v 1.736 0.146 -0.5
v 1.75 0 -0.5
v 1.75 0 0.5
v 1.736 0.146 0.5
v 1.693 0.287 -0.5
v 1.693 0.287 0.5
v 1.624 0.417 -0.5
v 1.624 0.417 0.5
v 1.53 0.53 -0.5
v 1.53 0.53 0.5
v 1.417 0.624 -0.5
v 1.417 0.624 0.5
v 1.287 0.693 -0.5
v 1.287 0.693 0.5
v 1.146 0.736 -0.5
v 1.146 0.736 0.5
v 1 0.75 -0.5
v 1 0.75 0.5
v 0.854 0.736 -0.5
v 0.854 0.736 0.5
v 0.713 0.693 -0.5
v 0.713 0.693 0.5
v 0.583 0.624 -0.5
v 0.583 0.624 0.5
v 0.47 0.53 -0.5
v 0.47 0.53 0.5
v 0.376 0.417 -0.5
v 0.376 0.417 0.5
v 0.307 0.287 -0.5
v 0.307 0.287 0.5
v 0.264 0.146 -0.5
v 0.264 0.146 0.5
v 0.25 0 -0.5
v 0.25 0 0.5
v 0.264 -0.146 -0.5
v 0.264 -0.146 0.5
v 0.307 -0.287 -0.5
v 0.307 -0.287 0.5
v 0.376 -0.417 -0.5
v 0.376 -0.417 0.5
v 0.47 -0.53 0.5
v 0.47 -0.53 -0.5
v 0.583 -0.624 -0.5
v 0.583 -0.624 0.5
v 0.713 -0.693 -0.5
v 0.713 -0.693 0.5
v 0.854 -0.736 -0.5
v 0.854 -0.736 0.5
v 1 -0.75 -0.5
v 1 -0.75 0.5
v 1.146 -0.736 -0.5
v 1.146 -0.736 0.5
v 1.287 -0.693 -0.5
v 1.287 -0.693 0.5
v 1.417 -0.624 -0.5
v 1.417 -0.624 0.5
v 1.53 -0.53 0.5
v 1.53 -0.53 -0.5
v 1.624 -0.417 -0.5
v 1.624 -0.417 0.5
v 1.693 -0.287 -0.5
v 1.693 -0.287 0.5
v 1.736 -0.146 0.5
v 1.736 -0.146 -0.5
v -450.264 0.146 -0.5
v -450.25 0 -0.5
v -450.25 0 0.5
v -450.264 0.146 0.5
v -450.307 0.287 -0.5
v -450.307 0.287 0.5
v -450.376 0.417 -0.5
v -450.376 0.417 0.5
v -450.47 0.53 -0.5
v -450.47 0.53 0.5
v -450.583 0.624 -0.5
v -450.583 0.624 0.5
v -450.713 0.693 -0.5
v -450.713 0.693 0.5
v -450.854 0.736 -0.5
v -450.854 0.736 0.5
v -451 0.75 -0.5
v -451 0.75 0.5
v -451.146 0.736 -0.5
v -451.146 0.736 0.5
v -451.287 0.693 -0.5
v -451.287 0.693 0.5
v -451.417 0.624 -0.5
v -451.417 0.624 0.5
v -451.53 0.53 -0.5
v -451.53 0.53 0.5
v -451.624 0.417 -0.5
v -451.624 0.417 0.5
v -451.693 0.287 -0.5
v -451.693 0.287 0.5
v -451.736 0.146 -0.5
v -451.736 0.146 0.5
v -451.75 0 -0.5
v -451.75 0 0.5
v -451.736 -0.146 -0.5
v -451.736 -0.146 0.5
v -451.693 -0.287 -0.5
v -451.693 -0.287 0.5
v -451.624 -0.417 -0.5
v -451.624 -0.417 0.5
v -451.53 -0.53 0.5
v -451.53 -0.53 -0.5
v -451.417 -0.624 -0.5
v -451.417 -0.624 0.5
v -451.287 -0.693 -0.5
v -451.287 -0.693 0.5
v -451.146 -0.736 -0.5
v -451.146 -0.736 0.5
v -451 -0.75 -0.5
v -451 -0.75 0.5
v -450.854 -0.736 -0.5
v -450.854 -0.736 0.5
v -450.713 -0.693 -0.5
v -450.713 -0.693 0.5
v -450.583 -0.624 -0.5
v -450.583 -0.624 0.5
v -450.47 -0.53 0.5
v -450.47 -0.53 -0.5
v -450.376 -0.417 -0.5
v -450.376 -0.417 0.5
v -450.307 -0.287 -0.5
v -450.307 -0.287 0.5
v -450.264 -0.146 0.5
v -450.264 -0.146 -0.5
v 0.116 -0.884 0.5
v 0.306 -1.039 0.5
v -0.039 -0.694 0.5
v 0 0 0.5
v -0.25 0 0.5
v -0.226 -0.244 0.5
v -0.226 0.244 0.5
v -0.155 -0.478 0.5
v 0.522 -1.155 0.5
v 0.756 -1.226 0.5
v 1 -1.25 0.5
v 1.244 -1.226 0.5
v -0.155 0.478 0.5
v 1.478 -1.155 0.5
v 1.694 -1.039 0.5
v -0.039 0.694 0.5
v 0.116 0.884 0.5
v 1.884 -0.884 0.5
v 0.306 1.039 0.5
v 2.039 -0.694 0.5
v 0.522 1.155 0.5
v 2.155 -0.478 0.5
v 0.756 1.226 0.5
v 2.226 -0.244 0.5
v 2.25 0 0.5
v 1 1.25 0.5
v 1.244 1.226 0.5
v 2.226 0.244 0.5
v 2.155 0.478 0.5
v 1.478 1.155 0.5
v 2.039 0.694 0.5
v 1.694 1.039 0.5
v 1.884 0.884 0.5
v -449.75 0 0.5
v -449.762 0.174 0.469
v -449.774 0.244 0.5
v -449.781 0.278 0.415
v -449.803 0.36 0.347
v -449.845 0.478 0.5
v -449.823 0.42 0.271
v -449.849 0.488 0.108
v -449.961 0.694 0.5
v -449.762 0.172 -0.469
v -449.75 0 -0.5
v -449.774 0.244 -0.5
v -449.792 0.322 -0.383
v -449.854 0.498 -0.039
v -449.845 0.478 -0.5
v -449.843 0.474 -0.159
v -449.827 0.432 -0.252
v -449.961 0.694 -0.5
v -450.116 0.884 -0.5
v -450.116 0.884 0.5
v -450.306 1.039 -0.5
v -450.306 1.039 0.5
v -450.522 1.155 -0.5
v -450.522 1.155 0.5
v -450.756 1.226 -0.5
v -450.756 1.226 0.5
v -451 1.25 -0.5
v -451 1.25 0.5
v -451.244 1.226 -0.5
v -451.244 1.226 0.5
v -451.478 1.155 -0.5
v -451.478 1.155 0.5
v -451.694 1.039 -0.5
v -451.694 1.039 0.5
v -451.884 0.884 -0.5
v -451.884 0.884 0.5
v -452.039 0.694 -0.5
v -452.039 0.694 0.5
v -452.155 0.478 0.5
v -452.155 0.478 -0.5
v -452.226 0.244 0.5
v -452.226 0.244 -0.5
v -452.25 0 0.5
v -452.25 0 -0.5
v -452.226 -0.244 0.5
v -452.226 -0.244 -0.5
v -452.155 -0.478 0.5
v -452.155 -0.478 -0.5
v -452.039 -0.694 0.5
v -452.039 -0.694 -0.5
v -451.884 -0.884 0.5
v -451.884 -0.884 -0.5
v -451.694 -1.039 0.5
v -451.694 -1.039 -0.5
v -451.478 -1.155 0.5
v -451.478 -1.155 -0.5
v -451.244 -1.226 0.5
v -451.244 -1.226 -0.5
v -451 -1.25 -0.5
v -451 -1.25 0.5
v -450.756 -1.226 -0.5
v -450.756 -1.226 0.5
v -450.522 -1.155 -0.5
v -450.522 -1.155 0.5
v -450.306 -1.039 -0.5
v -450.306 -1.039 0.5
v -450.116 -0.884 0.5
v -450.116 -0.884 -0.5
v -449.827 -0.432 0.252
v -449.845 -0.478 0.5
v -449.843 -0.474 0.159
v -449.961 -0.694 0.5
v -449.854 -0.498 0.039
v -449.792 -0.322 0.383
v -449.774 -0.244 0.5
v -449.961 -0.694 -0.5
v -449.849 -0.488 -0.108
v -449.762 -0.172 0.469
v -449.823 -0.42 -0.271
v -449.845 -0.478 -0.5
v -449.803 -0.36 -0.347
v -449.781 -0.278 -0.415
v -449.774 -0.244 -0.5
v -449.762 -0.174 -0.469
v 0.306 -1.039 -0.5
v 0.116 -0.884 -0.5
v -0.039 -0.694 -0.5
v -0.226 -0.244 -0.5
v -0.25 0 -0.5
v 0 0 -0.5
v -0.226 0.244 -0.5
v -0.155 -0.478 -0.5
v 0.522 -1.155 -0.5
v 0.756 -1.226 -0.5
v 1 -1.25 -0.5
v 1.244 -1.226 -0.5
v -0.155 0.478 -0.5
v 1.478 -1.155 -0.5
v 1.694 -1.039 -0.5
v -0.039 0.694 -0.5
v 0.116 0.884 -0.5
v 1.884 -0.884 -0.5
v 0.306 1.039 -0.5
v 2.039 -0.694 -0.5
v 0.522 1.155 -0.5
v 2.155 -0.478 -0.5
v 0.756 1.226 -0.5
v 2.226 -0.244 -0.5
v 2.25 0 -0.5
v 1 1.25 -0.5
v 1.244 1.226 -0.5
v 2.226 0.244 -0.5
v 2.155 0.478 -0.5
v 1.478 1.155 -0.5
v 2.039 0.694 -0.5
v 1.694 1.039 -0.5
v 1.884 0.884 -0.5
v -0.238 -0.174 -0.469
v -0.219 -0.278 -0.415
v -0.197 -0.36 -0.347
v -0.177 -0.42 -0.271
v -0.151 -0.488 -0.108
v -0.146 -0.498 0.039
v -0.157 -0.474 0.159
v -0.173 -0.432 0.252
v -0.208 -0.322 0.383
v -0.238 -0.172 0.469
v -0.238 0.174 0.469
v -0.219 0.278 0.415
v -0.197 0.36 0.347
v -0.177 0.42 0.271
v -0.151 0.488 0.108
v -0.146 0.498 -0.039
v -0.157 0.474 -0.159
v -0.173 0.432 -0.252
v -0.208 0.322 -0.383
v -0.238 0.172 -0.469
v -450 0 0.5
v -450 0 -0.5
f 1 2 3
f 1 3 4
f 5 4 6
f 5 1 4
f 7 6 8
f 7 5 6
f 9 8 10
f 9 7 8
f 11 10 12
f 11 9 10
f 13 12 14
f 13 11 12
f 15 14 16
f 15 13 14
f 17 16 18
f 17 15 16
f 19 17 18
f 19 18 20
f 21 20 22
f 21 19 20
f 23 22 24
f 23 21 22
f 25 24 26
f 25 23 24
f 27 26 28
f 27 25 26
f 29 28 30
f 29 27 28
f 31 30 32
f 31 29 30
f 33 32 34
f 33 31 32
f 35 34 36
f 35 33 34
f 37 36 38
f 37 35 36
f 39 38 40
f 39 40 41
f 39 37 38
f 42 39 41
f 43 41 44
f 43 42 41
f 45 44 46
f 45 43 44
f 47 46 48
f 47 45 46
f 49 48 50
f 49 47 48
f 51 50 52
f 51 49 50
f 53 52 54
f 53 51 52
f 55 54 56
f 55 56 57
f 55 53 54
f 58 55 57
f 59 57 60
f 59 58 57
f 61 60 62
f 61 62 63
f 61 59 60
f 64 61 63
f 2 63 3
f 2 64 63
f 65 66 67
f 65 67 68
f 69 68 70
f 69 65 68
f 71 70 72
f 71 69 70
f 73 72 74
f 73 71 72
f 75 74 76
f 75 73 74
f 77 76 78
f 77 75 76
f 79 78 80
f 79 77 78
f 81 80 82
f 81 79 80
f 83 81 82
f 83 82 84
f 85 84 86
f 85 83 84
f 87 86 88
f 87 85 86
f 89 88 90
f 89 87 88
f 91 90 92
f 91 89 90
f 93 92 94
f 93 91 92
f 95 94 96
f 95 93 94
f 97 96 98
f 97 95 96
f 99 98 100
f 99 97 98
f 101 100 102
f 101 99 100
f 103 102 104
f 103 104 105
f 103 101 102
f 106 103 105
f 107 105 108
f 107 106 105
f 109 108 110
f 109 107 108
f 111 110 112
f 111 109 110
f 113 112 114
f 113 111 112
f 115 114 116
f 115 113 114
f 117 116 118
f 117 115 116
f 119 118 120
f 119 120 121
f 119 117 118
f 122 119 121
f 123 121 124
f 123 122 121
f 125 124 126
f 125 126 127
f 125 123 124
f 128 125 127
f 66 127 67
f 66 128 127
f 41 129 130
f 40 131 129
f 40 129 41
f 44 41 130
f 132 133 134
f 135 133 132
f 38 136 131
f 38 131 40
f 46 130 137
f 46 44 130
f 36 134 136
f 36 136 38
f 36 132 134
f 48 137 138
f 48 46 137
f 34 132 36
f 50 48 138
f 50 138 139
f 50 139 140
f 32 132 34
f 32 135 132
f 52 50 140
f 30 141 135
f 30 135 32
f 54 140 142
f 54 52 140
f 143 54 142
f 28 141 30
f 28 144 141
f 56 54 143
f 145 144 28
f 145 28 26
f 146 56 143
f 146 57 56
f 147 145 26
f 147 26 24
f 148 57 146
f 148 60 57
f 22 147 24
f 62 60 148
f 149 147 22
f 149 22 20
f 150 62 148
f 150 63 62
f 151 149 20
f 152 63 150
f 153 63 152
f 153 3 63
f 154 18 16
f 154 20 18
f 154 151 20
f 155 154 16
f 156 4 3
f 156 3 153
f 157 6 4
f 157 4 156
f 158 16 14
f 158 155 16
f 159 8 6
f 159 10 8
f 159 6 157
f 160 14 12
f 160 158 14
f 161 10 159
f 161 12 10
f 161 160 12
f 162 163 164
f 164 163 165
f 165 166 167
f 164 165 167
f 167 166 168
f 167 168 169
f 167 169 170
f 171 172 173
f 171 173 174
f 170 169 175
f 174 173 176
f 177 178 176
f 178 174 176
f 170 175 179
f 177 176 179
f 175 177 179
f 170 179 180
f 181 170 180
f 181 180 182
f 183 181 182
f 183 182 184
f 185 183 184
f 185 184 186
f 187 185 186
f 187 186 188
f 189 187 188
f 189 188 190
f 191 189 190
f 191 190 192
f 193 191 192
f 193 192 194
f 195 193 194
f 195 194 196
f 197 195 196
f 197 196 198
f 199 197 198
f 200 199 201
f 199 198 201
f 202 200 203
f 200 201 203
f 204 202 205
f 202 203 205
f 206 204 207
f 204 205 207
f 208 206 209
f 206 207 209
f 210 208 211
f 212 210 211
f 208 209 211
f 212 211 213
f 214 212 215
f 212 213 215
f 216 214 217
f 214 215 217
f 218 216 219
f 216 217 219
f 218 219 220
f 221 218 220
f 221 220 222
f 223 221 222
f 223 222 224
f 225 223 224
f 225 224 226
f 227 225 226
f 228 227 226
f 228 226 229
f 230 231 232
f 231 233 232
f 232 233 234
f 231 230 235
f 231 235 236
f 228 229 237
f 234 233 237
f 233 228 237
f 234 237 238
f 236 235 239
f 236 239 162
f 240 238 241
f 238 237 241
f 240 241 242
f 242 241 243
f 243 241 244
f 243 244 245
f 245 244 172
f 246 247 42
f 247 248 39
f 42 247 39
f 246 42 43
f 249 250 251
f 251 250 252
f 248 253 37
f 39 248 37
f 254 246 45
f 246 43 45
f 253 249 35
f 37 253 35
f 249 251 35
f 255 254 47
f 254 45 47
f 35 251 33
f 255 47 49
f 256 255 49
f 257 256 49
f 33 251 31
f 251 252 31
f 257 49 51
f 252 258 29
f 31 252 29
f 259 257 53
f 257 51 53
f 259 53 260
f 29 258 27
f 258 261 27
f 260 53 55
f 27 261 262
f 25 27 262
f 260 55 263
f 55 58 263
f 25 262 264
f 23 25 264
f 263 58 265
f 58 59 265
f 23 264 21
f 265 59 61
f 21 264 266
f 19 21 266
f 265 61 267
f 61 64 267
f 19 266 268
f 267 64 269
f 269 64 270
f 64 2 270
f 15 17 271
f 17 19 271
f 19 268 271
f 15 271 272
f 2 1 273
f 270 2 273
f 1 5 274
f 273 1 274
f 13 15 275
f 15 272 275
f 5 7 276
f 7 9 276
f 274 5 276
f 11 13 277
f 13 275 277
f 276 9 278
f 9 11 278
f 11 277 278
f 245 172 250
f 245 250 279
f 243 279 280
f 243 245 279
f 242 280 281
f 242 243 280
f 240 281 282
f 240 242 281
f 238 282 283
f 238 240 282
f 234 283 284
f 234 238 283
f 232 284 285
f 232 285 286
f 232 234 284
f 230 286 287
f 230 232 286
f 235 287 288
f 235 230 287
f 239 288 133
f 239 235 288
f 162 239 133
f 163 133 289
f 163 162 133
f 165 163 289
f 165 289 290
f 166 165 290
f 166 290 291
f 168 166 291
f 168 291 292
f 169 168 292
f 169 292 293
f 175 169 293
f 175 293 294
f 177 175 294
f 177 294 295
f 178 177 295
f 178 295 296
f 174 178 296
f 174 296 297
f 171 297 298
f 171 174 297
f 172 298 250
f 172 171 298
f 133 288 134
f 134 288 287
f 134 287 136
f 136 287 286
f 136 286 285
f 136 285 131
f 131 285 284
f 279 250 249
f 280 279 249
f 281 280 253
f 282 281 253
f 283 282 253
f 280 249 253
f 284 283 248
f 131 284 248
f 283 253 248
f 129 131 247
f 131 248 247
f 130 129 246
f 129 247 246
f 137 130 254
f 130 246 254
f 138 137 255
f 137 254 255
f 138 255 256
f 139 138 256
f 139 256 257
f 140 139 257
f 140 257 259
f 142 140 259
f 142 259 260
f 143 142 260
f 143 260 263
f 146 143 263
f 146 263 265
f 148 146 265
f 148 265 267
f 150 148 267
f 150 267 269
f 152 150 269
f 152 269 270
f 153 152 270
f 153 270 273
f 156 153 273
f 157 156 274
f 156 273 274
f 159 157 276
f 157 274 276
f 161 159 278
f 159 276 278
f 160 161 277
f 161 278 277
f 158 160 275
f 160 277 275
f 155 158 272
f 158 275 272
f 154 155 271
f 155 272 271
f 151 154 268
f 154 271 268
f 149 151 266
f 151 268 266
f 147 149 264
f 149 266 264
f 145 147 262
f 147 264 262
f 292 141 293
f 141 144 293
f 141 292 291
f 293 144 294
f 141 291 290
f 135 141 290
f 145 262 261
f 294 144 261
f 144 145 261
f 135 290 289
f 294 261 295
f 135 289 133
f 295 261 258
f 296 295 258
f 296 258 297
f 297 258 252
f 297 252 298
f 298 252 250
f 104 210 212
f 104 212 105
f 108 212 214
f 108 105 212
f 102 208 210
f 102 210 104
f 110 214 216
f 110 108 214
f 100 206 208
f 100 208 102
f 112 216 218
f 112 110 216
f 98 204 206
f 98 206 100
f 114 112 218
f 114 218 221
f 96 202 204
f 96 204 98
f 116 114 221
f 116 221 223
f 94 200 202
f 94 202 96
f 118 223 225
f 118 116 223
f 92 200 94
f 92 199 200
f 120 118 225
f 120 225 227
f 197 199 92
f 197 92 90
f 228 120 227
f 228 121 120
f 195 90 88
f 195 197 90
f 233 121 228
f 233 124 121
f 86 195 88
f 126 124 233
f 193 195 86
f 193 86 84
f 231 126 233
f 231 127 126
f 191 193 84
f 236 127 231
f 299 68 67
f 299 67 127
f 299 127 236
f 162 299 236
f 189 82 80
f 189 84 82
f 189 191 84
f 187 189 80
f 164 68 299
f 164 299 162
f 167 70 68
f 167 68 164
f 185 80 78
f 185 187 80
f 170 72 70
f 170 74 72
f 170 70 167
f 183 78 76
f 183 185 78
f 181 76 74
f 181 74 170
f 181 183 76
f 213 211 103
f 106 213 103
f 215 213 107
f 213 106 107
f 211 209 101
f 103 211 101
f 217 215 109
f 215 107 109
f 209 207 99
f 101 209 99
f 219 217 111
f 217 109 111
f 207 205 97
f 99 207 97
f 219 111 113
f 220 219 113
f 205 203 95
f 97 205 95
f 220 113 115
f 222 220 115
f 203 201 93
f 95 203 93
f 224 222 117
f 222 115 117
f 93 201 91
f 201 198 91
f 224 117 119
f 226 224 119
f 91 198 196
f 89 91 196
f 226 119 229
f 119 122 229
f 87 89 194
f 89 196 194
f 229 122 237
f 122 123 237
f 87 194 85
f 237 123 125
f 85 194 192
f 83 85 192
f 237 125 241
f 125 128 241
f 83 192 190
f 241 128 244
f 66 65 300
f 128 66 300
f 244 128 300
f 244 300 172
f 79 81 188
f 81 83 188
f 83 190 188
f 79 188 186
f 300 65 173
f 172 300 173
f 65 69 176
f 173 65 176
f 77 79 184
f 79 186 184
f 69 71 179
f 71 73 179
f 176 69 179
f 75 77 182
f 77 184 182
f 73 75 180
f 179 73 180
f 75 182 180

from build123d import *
from build123d.topology import SkipClean

# Parameters (mm, degrees)
CROQUIS2_R                   = 0.5
SALIENTE_EXTRUIR1_DEPTH      = 0.5
SALIENTE_EXTRUIR1_DEPTH_BACK = 0.5
CROQUIS3_R                   = 1.25
CROQUIS3_R_2                 = 0.75


with BuildPart() as part:
    # Barrer1: sweep along a path in Croquis1
    with BuildLine(Plane.XY) as barrer1_path:
        Line((0, 0), (-450, 0))
    # Croquis2 → Barrer1 (sweep)
    with BuildSketch(Plane(origin=(0, 0, 0), x_dir=(0, 0, -1), z_dir=(1, 0, 0))):
        Circle(CROQUIS2_R)
    sweep(path=barrer1_path.line)

    # Croquis3 → Saliente-Extruir1 (add, two sides: drawn at the far end of the back side and taken through both)
    # profile 1 of 2: a face of its own
    with SkipClean():  # the faces are left unmerged after this step: merging them gives an invalid solid
        with BuildSketch(Plane.XY.offset(-SALIENTE_EXTRUIR1_DEPTH_BACK)):
            with Locations((1, 0)):
                Circle(CROQUIS3_R)
            with Locations((1, 0)):
                Circle(CROQUIS3_R_2, mode=Mode.SUBTRACT)
        # profile 2 of 2: a face of its own
        with BuildSketch(Plane.XY.offset(-SALIENTE_EXTRUIR1_DEPTH_BACK)):
            with Locations((-451, 0)):
                Circle(CROQUIS3_R)
            with Locations((-451, 0)):
                Circle(CROQUIS3_R_2, mode=Mode.SUBTRACT)
        extrude(amount=SALIENTE_EXTRUIR1_DEPTH + SALIENTE_EXTRUIR1_DEPTH_BACK)


solid = part.part
